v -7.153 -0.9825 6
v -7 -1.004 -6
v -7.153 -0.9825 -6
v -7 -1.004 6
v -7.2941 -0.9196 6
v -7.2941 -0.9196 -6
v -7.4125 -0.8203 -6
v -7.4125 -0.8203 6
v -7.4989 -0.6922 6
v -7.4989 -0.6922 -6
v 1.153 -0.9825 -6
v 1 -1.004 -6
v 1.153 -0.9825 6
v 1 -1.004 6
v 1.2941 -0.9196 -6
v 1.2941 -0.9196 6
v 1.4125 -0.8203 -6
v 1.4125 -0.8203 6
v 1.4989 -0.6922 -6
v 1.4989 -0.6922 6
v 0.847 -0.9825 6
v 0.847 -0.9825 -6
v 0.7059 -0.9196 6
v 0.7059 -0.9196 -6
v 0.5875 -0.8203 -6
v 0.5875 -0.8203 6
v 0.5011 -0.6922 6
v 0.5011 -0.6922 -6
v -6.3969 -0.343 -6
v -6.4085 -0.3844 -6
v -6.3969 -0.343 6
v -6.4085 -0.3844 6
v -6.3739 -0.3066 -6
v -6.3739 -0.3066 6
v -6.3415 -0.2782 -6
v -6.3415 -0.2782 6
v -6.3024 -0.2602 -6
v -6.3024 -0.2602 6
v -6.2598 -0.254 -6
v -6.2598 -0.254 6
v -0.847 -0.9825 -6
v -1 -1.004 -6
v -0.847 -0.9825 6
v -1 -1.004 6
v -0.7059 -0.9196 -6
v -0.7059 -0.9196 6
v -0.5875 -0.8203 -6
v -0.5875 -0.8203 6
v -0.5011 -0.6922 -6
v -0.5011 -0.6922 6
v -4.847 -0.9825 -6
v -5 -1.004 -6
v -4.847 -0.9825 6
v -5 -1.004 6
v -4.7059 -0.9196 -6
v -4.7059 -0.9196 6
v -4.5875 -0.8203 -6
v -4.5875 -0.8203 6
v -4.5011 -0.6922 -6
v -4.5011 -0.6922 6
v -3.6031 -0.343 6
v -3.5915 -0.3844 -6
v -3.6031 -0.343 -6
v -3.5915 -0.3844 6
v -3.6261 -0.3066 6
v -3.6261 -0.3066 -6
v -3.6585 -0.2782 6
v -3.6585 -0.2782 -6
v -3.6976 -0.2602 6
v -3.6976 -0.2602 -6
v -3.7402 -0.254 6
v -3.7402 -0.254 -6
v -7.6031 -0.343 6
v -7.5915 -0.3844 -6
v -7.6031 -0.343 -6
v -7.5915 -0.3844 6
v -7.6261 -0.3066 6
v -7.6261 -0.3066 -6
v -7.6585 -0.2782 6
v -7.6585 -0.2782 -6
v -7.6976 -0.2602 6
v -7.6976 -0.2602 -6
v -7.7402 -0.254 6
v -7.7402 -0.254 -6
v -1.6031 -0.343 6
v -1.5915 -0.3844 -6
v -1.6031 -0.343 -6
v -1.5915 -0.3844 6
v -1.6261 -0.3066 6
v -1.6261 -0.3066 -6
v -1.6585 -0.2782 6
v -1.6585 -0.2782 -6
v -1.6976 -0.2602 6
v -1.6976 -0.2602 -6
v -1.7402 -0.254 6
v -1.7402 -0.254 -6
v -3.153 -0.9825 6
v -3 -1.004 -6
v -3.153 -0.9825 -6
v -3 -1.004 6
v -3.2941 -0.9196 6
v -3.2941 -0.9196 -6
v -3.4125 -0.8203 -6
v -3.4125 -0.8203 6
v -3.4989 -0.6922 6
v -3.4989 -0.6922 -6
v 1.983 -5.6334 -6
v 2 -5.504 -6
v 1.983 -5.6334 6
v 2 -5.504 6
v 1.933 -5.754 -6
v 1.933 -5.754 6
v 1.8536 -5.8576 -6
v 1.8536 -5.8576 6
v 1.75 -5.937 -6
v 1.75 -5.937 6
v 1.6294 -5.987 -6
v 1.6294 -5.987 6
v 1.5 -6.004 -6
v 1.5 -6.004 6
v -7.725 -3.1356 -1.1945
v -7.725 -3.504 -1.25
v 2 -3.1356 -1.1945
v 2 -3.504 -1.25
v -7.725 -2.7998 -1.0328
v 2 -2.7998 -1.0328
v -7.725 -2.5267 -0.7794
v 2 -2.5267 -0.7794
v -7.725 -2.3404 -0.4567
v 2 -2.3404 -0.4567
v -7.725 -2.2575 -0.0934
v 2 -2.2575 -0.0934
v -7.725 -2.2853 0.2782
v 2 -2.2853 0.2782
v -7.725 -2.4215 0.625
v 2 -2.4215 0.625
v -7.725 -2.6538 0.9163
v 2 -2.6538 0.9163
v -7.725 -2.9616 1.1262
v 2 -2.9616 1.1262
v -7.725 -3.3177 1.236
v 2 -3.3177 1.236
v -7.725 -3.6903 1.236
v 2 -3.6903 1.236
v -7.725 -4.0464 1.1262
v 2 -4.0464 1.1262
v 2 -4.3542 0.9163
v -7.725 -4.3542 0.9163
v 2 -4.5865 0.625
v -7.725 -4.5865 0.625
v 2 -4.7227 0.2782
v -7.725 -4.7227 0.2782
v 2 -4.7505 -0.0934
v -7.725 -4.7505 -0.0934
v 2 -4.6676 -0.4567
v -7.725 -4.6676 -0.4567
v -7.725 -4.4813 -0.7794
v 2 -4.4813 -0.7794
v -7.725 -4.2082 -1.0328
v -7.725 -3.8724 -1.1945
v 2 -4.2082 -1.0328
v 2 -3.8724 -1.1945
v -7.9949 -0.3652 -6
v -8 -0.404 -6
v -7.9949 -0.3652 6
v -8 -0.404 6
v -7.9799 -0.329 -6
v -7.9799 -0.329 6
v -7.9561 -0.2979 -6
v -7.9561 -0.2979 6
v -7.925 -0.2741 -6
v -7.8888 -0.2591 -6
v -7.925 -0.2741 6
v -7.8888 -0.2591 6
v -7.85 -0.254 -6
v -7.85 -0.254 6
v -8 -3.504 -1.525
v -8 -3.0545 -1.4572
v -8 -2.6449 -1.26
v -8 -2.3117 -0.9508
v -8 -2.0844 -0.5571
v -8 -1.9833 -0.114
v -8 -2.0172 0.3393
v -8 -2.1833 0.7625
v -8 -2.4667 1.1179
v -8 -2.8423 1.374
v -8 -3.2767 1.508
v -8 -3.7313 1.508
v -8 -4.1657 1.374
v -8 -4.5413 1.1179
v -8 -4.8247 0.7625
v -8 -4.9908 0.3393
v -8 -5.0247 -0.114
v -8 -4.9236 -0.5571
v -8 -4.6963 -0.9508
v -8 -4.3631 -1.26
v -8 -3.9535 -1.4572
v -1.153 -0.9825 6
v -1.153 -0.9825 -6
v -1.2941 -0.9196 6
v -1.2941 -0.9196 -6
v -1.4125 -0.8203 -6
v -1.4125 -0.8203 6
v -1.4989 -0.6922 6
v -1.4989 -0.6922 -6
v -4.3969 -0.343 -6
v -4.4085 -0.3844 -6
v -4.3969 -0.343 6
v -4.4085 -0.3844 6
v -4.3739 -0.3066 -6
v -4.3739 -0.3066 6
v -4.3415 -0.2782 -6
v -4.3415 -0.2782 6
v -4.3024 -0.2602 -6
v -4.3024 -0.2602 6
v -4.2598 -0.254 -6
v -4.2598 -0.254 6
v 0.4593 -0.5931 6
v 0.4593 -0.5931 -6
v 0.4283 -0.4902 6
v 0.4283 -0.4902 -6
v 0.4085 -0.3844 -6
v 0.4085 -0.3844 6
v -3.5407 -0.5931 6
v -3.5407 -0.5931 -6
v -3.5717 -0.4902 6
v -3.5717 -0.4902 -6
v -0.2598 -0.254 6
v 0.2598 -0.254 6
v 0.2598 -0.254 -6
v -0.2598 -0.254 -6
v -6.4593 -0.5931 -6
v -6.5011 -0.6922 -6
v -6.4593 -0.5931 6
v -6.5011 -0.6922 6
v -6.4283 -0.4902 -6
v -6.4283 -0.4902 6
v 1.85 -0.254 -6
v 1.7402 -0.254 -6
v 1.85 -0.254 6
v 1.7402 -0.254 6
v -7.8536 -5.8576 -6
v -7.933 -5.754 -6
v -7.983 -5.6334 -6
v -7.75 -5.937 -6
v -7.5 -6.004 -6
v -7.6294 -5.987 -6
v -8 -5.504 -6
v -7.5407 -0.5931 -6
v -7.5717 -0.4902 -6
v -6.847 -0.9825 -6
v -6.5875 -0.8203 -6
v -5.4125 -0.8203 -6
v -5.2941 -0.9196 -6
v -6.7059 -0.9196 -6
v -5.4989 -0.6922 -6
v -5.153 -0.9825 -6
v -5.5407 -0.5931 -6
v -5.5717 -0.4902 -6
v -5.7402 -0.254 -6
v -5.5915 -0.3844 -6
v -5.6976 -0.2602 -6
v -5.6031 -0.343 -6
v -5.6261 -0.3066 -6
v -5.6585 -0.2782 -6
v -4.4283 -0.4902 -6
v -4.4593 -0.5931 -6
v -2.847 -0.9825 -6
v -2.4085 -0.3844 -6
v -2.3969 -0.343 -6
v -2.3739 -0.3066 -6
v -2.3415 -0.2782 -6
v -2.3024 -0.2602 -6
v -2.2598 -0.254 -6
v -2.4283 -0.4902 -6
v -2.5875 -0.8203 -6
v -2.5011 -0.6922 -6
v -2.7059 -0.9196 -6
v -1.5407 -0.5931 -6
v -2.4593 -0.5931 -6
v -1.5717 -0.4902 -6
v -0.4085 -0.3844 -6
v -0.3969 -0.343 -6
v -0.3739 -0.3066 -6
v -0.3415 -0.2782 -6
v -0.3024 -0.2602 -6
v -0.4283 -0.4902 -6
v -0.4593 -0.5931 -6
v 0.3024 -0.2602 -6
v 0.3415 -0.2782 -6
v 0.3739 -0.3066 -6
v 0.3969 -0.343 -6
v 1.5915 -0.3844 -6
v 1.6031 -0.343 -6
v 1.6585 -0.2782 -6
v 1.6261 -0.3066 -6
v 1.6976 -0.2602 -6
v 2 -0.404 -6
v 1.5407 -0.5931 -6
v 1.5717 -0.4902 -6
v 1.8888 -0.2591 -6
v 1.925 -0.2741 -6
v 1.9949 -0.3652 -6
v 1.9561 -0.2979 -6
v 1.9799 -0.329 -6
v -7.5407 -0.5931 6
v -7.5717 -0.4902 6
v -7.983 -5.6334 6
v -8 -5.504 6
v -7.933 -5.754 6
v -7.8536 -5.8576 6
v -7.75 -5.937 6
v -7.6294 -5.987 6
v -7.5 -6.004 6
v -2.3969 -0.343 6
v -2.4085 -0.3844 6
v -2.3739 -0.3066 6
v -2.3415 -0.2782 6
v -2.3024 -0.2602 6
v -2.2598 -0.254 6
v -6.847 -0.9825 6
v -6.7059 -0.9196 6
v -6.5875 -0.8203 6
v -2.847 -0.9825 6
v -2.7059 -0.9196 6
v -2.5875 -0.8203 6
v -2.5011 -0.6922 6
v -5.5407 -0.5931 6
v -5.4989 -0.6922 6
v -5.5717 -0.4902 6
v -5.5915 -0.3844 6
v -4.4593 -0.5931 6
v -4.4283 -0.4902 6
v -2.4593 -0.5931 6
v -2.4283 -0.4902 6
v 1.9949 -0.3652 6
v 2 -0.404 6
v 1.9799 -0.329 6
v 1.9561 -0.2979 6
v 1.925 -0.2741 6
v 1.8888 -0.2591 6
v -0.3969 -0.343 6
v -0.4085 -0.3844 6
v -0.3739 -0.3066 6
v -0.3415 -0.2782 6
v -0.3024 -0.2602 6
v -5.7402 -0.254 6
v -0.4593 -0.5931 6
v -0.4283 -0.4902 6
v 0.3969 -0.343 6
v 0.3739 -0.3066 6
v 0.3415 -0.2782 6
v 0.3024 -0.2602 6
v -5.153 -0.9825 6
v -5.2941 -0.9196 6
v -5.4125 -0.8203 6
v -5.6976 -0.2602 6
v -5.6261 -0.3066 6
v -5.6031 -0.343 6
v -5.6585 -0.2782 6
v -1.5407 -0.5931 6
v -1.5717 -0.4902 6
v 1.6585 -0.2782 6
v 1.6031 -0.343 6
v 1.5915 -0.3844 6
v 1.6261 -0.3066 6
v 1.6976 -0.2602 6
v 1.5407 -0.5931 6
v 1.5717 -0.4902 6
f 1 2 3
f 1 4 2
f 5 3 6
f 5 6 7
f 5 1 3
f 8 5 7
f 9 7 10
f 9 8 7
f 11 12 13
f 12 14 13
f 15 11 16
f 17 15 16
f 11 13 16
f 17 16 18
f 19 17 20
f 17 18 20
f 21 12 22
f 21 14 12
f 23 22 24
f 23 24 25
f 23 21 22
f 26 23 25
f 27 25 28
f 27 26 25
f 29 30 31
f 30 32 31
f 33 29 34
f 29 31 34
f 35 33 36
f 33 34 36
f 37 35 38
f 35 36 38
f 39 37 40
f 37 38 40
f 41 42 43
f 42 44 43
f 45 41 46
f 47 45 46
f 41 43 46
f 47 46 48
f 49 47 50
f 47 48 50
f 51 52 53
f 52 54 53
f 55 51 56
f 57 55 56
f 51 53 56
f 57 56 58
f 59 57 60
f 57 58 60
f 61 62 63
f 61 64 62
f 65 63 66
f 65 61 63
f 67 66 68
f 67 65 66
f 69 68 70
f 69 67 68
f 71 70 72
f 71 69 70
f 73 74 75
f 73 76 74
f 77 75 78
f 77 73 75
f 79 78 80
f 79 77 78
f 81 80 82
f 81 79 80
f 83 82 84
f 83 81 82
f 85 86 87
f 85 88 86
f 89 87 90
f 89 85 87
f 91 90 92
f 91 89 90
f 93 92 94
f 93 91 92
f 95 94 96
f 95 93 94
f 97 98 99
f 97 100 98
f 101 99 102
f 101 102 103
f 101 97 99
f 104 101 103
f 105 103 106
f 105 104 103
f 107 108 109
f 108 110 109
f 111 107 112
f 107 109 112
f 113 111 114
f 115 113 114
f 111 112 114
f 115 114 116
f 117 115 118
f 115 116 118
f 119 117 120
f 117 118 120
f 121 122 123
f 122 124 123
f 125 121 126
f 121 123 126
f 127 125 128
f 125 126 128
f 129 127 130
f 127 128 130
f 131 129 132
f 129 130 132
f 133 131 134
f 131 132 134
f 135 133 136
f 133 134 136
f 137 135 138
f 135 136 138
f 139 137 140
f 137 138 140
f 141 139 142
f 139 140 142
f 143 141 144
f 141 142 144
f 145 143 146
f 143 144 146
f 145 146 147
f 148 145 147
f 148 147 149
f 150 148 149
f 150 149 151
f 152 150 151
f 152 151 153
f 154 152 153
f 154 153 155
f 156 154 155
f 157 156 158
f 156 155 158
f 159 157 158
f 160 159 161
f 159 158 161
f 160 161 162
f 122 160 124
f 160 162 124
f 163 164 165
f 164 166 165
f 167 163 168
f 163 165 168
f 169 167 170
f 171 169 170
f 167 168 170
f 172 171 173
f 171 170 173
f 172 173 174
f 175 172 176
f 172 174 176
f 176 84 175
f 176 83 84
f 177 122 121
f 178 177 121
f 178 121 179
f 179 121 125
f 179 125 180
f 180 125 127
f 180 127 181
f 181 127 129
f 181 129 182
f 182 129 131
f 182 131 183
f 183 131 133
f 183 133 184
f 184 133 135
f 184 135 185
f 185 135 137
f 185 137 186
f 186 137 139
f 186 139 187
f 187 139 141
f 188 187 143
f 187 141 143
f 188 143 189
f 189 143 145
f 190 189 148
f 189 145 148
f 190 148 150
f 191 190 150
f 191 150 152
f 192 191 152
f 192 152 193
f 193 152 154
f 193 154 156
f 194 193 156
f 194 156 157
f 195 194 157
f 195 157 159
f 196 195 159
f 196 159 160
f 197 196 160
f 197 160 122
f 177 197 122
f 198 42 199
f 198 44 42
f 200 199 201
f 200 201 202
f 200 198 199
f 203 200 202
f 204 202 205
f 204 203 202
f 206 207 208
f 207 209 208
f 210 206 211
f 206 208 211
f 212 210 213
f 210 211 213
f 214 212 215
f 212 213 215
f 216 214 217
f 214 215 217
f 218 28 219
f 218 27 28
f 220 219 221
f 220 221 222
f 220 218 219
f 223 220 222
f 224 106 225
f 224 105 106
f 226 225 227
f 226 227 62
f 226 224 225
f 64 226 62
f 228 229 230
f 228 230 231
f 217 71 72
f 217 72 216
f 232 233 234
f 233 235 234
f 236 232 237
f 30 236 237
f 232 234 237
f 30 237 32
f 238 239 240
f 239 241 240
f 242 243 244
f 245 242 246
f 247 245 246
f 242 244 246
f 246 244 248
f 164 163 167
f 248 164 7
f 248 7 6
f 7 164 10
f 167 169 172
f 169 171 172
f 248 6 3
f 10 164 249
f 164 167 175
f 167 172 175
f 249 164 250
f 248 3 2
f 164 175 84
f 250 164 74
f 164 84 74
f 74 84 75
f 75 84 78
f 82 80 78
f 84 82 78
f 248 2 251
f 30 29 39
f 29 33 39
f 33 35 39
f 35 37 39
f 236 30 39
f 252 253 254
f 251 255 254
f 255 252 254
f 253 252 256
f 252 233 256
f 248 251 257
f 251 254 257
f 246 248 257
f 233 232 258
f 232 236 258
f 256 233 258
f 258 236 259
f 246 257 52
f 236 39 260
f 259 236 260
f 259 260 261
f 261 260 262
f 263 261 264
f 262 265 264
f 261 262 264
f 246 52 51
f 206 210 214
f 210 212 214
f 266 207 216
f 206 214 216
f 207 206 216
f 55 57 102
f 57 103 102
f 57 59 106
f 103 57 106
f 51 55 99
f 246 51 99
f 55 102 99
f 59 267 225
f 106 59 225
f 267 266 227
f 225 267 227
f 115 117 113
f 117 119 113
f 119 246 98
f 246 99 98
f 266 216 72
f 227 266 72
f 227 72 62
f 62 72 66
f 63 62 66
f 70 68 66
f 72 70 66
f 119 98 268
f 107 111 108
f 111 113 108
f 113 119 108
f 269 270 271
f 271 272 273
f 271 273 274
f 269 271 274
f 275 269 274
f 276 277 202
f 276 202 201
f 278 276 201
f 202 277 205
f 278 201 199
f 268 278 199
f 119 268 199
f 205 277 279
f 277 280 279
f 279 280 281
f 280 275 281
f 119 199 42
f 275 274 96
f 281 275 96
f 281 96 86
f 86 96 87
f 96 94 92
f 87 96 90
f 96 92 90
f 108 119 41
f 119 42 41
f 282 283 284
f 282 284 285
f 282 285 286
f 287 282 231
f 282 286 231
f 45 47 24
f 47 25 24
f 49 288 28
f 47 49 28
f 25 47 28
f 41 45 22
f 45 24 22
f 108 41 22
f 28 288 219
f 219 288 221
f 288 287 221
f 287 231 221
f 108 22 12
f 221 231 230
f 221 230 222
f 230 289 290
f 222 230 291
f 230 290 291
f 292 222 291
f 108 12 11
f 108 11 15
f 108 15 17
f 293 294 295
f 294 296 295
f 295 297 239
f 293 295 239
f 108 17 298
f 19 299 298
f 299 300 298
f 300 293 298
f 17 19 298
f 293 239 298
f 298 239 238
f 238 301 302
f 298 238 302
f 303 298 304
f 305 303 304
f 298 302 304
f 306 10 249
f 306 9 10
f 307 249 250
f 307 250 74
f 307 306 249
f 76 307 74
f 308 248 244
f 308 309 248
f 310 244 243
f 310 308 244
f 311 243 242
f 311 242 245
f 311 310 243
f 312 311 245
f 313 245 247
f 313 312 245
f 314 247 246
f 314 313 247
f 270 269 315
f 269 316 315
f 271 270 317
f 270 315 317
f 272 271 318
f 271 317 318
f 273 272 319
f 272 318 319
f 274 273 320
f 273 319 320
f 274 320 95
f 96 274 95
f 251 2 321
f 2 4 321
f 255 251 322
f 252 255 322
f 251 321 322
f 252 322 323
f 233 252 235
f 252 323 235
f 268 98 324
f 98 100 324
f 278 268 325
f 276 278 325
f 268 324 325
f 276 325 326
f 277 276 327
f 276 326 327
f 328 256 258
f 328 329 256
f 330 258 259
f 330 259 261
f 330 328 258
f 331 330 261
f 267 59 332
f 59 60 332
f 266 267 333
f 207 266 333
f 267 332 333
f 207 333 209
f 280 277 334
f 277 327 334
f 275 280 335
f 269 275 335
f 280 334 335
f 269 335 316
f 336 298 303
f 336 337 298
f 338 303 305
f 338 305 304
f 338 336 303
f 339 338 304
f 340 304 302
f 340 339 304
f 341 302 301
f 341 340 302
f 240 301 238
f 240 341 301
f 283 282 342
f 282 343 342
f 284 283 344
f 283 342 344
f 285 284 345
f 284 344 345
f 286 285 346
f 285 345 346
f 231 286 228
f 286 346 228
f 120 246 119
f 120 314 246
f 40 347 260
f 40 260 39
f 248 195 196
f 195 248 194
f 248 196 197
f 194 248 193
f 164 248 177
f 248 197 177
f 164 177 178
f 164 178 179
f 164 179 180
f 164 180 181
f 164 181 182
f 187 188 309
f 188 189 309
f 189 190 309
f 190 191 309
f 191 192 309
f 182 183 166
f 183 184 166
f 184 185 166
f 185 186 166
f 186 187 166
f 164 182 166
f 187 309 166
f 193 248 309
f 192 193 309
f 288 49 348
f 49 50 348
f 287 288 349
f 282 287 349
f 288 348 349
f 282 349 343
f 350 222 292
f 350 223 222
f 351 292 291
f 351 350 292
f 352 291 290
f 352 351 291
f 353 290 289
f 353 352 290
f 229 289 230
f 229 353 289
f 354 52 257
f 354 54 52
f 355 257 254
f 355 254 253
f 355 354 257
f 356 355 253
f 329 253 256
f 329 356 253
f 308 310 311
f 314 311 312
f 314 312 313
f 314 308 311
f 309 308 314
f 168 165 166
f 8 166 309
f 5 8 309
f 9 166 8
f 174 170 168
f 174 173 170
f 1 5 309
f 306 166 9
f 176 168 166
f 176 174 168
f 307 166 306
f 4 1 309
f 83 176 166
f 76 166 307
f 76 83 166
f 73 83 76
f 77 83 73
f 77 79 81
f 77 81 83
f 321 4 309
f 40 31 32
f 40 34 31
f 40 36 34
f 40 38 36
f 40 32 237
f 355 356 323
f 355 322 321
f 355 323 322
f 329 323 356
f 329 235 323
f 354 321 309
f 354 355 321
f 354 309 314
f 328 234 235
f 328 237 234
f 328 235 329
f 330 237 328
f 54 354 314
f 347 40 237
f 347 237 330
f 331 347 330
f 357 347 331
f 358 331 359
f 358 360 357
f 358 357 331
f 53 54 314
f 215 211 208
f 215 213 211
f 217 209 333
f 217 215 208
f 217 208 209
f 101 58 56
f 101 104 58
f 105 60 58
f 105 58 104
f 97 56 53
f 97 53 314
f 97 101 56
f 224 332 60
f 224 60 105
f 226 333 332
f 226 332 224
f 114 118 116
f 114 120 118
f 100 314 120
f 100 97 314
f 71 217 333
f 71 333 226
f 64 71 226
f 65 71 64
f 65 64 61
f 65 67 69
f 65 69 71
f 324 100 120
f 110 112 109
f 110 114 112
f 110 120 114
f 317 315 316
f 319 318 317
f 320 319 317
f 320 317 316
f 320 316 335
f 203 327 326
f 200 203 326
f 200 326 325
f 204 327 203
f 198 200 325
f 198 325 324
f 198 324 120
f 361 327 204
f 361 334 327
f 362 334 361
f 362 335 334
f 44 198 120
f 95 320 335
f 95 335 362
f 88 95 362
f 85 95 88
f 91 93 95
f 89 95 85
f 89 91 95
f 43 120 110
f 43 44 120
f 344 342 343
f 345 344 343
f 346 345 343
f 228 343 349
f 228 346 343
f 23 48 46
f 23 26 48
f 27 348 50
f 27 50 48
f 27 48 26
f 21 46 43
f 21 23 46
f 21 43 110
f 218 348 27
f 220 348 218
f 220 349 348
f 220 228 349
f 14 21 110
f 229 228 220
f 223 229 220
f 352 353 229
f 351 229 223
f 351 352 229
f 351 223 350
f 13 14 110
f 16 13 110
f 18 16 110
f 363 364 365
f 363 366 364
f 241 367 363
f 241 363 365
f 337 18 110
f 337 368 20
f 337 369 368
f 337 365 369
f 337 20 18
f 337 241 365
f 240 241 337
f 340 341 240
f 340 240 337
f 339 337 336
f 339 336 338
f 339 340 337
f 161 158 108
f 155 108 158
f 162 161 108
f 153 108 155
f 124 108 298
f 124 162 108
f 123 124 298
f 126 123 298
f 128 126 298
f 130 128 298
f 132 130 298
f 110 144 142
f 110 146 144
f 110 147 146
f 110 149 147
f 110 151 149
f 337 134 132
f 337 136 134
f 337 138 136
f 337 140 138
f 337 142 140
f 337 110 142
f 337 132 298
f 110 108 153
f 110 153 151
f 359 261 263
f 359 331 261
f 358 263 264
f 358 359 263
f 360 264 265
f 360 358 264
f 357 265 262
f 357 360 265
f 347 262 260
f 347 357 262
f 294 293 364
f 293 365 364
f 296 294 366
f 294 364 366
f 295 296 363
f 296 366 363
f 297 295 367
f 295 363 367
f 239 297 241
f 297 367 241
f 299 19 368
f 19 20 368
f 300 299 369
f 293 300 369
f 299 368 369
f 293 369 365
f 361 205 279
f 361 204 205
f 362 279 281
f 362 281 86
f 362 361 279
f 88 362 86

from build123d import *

# Parameters (mm, degrees)
BOSS_EXTRUDE1_DEPTH             = 6
LPATTERN1_COUNT                 = 5
LPATTERN1_PITCH                 = 2
SKETCH4_W                       = 10
SKETCH4_H                       = 6.004
BOSS_EXTRUDE3_DEPTH             = 6
M3X0_5_TAPPED_HOLE1_D           = 2.5
M3X0_5_TAPPED_HOLE1_CSINK_D     = 3.05
M3X0_5_TAPPED_HOLE1_CSINK_ANGLE = 90
FILLET1_R                       = 0.5
FILLET2_R                       = 0.15


with BuildPart() as part:
    # Sketch1 → Boss-Extrude1 (new, symmetric)
    with BuildSketch(Plane.XY):
        with BuildLine():
            Line((0, 0), (1, 0))
            Line((1, 0), (1, -1.004))
            ThreePointArc((1, -1.004), (0.705850588, -0.919639059), (0.501123596, -0.692202247))
            ThreePointArc((0.501123596, -0.692202247), (0.442388286, -0.542062154), (0.408543109, -0.384434783))
            ThreePointArc((0.408543109, -0.384434783), (0.358731646, -0.291228588), (0.259824575, -0.254))
            Line((0.259824575, -0.254), (0, -0.254))
            Line((0, -0.254), (0, 0))
        make_face()
    extrude(amount=BOSS_EXTRUDE1_DEPTH, both=True)

    # Mirror1: part across plane


with BuildPart() as part_1:
    add(part.part)
    add(part.part.mirror(Plane(origin=(1, 0, 6), x_dir=(0, 0, 1), z_dir=(-1, 0, 0))))


with BuildPart() as lpattern1_1:
    # LPattern1: pattern copy
    add(part_1.part.moved(Location(Vector(-1, 0, 0) * (1 * LPATTERN1_PITCH))))


with BuildPart() as lpattern1_2:
    # LPattern1: pattern copy
    add(part_1.part.moved(Location(Vector(-1, 0, 0) * (2 * LPATTERN1_PITCH))))


with BuildPart() as lpattern1_3:
    # LPattern1: pattern copy
    add(part_1.part.moved(Location(Vector(-1, 0, 0) * (3 * LPATTERN1_PITCH))))


with BuildPart() as lpattern1_4:
    # LPattern1: pattern copy
    add(part_1.part.moved(Location(Vector(-1, 0, 0) * (4 * LPATTERN1_PITCH))))


with BuildPart() as lpattern1_1_1:
    add(lpattern1_1.part)

    # Combine1: union LPattern1_4, part, LPattern1_3, LPattern1_2
    add(lpattern1_4.part)
    add(part_1.part)
    add(lpattern1_3.part)
    add(lpattern1_2.part)


with BuildPart() as body_2:
    # Sketch4 → Boss-Extrude3 (new, symmetric)
    with BuildSketch(Plane.XY):
        with Locations((-3, -3.002)):
            Rectangle(SKETCH4_W, SKETCH4_H)
    extrude(amount=BOSS_EXTRUDE3_DEPTH, both=True)

    # Combine2: cut LPattern1_1
    add(lpattern1_1_1.part, mode=Mode.SUBTRACT)

    # M3x0.5 Tapped Hole1 (through all)
    with Locations(Plane.ZY.offset(8)):
        with Locations((0, -3.504)):
            CounterSinkHole(M3X0_5_TAPPED_HOLE1_D / 2, M3X0_5_TAPPED_HOLE1_CSINK_D / 2, counter_sink_angle=M3X0_5_TAPPED_HOLE1_CSINK_ANGLE)

    # Fillet1
    fillet1_edges = [body_2.edges().sort_by_distance(p)[0] for p in [
        (2, -6.004, 0),
        (-8, -6.004, 0),
    ]]
    fillet(fillet1_edges, radius=FILLET1_R)

    # Fillet2
    fillet2_edges = [body_2.edges().sort_by_distance(p)[0] for p in [
        (-8, -0.254, 0),
        (2, -0.254, 0),
    ]]
    fillet(fillet2_edges, radius=FILLET2_R)


solid = body_2.part
